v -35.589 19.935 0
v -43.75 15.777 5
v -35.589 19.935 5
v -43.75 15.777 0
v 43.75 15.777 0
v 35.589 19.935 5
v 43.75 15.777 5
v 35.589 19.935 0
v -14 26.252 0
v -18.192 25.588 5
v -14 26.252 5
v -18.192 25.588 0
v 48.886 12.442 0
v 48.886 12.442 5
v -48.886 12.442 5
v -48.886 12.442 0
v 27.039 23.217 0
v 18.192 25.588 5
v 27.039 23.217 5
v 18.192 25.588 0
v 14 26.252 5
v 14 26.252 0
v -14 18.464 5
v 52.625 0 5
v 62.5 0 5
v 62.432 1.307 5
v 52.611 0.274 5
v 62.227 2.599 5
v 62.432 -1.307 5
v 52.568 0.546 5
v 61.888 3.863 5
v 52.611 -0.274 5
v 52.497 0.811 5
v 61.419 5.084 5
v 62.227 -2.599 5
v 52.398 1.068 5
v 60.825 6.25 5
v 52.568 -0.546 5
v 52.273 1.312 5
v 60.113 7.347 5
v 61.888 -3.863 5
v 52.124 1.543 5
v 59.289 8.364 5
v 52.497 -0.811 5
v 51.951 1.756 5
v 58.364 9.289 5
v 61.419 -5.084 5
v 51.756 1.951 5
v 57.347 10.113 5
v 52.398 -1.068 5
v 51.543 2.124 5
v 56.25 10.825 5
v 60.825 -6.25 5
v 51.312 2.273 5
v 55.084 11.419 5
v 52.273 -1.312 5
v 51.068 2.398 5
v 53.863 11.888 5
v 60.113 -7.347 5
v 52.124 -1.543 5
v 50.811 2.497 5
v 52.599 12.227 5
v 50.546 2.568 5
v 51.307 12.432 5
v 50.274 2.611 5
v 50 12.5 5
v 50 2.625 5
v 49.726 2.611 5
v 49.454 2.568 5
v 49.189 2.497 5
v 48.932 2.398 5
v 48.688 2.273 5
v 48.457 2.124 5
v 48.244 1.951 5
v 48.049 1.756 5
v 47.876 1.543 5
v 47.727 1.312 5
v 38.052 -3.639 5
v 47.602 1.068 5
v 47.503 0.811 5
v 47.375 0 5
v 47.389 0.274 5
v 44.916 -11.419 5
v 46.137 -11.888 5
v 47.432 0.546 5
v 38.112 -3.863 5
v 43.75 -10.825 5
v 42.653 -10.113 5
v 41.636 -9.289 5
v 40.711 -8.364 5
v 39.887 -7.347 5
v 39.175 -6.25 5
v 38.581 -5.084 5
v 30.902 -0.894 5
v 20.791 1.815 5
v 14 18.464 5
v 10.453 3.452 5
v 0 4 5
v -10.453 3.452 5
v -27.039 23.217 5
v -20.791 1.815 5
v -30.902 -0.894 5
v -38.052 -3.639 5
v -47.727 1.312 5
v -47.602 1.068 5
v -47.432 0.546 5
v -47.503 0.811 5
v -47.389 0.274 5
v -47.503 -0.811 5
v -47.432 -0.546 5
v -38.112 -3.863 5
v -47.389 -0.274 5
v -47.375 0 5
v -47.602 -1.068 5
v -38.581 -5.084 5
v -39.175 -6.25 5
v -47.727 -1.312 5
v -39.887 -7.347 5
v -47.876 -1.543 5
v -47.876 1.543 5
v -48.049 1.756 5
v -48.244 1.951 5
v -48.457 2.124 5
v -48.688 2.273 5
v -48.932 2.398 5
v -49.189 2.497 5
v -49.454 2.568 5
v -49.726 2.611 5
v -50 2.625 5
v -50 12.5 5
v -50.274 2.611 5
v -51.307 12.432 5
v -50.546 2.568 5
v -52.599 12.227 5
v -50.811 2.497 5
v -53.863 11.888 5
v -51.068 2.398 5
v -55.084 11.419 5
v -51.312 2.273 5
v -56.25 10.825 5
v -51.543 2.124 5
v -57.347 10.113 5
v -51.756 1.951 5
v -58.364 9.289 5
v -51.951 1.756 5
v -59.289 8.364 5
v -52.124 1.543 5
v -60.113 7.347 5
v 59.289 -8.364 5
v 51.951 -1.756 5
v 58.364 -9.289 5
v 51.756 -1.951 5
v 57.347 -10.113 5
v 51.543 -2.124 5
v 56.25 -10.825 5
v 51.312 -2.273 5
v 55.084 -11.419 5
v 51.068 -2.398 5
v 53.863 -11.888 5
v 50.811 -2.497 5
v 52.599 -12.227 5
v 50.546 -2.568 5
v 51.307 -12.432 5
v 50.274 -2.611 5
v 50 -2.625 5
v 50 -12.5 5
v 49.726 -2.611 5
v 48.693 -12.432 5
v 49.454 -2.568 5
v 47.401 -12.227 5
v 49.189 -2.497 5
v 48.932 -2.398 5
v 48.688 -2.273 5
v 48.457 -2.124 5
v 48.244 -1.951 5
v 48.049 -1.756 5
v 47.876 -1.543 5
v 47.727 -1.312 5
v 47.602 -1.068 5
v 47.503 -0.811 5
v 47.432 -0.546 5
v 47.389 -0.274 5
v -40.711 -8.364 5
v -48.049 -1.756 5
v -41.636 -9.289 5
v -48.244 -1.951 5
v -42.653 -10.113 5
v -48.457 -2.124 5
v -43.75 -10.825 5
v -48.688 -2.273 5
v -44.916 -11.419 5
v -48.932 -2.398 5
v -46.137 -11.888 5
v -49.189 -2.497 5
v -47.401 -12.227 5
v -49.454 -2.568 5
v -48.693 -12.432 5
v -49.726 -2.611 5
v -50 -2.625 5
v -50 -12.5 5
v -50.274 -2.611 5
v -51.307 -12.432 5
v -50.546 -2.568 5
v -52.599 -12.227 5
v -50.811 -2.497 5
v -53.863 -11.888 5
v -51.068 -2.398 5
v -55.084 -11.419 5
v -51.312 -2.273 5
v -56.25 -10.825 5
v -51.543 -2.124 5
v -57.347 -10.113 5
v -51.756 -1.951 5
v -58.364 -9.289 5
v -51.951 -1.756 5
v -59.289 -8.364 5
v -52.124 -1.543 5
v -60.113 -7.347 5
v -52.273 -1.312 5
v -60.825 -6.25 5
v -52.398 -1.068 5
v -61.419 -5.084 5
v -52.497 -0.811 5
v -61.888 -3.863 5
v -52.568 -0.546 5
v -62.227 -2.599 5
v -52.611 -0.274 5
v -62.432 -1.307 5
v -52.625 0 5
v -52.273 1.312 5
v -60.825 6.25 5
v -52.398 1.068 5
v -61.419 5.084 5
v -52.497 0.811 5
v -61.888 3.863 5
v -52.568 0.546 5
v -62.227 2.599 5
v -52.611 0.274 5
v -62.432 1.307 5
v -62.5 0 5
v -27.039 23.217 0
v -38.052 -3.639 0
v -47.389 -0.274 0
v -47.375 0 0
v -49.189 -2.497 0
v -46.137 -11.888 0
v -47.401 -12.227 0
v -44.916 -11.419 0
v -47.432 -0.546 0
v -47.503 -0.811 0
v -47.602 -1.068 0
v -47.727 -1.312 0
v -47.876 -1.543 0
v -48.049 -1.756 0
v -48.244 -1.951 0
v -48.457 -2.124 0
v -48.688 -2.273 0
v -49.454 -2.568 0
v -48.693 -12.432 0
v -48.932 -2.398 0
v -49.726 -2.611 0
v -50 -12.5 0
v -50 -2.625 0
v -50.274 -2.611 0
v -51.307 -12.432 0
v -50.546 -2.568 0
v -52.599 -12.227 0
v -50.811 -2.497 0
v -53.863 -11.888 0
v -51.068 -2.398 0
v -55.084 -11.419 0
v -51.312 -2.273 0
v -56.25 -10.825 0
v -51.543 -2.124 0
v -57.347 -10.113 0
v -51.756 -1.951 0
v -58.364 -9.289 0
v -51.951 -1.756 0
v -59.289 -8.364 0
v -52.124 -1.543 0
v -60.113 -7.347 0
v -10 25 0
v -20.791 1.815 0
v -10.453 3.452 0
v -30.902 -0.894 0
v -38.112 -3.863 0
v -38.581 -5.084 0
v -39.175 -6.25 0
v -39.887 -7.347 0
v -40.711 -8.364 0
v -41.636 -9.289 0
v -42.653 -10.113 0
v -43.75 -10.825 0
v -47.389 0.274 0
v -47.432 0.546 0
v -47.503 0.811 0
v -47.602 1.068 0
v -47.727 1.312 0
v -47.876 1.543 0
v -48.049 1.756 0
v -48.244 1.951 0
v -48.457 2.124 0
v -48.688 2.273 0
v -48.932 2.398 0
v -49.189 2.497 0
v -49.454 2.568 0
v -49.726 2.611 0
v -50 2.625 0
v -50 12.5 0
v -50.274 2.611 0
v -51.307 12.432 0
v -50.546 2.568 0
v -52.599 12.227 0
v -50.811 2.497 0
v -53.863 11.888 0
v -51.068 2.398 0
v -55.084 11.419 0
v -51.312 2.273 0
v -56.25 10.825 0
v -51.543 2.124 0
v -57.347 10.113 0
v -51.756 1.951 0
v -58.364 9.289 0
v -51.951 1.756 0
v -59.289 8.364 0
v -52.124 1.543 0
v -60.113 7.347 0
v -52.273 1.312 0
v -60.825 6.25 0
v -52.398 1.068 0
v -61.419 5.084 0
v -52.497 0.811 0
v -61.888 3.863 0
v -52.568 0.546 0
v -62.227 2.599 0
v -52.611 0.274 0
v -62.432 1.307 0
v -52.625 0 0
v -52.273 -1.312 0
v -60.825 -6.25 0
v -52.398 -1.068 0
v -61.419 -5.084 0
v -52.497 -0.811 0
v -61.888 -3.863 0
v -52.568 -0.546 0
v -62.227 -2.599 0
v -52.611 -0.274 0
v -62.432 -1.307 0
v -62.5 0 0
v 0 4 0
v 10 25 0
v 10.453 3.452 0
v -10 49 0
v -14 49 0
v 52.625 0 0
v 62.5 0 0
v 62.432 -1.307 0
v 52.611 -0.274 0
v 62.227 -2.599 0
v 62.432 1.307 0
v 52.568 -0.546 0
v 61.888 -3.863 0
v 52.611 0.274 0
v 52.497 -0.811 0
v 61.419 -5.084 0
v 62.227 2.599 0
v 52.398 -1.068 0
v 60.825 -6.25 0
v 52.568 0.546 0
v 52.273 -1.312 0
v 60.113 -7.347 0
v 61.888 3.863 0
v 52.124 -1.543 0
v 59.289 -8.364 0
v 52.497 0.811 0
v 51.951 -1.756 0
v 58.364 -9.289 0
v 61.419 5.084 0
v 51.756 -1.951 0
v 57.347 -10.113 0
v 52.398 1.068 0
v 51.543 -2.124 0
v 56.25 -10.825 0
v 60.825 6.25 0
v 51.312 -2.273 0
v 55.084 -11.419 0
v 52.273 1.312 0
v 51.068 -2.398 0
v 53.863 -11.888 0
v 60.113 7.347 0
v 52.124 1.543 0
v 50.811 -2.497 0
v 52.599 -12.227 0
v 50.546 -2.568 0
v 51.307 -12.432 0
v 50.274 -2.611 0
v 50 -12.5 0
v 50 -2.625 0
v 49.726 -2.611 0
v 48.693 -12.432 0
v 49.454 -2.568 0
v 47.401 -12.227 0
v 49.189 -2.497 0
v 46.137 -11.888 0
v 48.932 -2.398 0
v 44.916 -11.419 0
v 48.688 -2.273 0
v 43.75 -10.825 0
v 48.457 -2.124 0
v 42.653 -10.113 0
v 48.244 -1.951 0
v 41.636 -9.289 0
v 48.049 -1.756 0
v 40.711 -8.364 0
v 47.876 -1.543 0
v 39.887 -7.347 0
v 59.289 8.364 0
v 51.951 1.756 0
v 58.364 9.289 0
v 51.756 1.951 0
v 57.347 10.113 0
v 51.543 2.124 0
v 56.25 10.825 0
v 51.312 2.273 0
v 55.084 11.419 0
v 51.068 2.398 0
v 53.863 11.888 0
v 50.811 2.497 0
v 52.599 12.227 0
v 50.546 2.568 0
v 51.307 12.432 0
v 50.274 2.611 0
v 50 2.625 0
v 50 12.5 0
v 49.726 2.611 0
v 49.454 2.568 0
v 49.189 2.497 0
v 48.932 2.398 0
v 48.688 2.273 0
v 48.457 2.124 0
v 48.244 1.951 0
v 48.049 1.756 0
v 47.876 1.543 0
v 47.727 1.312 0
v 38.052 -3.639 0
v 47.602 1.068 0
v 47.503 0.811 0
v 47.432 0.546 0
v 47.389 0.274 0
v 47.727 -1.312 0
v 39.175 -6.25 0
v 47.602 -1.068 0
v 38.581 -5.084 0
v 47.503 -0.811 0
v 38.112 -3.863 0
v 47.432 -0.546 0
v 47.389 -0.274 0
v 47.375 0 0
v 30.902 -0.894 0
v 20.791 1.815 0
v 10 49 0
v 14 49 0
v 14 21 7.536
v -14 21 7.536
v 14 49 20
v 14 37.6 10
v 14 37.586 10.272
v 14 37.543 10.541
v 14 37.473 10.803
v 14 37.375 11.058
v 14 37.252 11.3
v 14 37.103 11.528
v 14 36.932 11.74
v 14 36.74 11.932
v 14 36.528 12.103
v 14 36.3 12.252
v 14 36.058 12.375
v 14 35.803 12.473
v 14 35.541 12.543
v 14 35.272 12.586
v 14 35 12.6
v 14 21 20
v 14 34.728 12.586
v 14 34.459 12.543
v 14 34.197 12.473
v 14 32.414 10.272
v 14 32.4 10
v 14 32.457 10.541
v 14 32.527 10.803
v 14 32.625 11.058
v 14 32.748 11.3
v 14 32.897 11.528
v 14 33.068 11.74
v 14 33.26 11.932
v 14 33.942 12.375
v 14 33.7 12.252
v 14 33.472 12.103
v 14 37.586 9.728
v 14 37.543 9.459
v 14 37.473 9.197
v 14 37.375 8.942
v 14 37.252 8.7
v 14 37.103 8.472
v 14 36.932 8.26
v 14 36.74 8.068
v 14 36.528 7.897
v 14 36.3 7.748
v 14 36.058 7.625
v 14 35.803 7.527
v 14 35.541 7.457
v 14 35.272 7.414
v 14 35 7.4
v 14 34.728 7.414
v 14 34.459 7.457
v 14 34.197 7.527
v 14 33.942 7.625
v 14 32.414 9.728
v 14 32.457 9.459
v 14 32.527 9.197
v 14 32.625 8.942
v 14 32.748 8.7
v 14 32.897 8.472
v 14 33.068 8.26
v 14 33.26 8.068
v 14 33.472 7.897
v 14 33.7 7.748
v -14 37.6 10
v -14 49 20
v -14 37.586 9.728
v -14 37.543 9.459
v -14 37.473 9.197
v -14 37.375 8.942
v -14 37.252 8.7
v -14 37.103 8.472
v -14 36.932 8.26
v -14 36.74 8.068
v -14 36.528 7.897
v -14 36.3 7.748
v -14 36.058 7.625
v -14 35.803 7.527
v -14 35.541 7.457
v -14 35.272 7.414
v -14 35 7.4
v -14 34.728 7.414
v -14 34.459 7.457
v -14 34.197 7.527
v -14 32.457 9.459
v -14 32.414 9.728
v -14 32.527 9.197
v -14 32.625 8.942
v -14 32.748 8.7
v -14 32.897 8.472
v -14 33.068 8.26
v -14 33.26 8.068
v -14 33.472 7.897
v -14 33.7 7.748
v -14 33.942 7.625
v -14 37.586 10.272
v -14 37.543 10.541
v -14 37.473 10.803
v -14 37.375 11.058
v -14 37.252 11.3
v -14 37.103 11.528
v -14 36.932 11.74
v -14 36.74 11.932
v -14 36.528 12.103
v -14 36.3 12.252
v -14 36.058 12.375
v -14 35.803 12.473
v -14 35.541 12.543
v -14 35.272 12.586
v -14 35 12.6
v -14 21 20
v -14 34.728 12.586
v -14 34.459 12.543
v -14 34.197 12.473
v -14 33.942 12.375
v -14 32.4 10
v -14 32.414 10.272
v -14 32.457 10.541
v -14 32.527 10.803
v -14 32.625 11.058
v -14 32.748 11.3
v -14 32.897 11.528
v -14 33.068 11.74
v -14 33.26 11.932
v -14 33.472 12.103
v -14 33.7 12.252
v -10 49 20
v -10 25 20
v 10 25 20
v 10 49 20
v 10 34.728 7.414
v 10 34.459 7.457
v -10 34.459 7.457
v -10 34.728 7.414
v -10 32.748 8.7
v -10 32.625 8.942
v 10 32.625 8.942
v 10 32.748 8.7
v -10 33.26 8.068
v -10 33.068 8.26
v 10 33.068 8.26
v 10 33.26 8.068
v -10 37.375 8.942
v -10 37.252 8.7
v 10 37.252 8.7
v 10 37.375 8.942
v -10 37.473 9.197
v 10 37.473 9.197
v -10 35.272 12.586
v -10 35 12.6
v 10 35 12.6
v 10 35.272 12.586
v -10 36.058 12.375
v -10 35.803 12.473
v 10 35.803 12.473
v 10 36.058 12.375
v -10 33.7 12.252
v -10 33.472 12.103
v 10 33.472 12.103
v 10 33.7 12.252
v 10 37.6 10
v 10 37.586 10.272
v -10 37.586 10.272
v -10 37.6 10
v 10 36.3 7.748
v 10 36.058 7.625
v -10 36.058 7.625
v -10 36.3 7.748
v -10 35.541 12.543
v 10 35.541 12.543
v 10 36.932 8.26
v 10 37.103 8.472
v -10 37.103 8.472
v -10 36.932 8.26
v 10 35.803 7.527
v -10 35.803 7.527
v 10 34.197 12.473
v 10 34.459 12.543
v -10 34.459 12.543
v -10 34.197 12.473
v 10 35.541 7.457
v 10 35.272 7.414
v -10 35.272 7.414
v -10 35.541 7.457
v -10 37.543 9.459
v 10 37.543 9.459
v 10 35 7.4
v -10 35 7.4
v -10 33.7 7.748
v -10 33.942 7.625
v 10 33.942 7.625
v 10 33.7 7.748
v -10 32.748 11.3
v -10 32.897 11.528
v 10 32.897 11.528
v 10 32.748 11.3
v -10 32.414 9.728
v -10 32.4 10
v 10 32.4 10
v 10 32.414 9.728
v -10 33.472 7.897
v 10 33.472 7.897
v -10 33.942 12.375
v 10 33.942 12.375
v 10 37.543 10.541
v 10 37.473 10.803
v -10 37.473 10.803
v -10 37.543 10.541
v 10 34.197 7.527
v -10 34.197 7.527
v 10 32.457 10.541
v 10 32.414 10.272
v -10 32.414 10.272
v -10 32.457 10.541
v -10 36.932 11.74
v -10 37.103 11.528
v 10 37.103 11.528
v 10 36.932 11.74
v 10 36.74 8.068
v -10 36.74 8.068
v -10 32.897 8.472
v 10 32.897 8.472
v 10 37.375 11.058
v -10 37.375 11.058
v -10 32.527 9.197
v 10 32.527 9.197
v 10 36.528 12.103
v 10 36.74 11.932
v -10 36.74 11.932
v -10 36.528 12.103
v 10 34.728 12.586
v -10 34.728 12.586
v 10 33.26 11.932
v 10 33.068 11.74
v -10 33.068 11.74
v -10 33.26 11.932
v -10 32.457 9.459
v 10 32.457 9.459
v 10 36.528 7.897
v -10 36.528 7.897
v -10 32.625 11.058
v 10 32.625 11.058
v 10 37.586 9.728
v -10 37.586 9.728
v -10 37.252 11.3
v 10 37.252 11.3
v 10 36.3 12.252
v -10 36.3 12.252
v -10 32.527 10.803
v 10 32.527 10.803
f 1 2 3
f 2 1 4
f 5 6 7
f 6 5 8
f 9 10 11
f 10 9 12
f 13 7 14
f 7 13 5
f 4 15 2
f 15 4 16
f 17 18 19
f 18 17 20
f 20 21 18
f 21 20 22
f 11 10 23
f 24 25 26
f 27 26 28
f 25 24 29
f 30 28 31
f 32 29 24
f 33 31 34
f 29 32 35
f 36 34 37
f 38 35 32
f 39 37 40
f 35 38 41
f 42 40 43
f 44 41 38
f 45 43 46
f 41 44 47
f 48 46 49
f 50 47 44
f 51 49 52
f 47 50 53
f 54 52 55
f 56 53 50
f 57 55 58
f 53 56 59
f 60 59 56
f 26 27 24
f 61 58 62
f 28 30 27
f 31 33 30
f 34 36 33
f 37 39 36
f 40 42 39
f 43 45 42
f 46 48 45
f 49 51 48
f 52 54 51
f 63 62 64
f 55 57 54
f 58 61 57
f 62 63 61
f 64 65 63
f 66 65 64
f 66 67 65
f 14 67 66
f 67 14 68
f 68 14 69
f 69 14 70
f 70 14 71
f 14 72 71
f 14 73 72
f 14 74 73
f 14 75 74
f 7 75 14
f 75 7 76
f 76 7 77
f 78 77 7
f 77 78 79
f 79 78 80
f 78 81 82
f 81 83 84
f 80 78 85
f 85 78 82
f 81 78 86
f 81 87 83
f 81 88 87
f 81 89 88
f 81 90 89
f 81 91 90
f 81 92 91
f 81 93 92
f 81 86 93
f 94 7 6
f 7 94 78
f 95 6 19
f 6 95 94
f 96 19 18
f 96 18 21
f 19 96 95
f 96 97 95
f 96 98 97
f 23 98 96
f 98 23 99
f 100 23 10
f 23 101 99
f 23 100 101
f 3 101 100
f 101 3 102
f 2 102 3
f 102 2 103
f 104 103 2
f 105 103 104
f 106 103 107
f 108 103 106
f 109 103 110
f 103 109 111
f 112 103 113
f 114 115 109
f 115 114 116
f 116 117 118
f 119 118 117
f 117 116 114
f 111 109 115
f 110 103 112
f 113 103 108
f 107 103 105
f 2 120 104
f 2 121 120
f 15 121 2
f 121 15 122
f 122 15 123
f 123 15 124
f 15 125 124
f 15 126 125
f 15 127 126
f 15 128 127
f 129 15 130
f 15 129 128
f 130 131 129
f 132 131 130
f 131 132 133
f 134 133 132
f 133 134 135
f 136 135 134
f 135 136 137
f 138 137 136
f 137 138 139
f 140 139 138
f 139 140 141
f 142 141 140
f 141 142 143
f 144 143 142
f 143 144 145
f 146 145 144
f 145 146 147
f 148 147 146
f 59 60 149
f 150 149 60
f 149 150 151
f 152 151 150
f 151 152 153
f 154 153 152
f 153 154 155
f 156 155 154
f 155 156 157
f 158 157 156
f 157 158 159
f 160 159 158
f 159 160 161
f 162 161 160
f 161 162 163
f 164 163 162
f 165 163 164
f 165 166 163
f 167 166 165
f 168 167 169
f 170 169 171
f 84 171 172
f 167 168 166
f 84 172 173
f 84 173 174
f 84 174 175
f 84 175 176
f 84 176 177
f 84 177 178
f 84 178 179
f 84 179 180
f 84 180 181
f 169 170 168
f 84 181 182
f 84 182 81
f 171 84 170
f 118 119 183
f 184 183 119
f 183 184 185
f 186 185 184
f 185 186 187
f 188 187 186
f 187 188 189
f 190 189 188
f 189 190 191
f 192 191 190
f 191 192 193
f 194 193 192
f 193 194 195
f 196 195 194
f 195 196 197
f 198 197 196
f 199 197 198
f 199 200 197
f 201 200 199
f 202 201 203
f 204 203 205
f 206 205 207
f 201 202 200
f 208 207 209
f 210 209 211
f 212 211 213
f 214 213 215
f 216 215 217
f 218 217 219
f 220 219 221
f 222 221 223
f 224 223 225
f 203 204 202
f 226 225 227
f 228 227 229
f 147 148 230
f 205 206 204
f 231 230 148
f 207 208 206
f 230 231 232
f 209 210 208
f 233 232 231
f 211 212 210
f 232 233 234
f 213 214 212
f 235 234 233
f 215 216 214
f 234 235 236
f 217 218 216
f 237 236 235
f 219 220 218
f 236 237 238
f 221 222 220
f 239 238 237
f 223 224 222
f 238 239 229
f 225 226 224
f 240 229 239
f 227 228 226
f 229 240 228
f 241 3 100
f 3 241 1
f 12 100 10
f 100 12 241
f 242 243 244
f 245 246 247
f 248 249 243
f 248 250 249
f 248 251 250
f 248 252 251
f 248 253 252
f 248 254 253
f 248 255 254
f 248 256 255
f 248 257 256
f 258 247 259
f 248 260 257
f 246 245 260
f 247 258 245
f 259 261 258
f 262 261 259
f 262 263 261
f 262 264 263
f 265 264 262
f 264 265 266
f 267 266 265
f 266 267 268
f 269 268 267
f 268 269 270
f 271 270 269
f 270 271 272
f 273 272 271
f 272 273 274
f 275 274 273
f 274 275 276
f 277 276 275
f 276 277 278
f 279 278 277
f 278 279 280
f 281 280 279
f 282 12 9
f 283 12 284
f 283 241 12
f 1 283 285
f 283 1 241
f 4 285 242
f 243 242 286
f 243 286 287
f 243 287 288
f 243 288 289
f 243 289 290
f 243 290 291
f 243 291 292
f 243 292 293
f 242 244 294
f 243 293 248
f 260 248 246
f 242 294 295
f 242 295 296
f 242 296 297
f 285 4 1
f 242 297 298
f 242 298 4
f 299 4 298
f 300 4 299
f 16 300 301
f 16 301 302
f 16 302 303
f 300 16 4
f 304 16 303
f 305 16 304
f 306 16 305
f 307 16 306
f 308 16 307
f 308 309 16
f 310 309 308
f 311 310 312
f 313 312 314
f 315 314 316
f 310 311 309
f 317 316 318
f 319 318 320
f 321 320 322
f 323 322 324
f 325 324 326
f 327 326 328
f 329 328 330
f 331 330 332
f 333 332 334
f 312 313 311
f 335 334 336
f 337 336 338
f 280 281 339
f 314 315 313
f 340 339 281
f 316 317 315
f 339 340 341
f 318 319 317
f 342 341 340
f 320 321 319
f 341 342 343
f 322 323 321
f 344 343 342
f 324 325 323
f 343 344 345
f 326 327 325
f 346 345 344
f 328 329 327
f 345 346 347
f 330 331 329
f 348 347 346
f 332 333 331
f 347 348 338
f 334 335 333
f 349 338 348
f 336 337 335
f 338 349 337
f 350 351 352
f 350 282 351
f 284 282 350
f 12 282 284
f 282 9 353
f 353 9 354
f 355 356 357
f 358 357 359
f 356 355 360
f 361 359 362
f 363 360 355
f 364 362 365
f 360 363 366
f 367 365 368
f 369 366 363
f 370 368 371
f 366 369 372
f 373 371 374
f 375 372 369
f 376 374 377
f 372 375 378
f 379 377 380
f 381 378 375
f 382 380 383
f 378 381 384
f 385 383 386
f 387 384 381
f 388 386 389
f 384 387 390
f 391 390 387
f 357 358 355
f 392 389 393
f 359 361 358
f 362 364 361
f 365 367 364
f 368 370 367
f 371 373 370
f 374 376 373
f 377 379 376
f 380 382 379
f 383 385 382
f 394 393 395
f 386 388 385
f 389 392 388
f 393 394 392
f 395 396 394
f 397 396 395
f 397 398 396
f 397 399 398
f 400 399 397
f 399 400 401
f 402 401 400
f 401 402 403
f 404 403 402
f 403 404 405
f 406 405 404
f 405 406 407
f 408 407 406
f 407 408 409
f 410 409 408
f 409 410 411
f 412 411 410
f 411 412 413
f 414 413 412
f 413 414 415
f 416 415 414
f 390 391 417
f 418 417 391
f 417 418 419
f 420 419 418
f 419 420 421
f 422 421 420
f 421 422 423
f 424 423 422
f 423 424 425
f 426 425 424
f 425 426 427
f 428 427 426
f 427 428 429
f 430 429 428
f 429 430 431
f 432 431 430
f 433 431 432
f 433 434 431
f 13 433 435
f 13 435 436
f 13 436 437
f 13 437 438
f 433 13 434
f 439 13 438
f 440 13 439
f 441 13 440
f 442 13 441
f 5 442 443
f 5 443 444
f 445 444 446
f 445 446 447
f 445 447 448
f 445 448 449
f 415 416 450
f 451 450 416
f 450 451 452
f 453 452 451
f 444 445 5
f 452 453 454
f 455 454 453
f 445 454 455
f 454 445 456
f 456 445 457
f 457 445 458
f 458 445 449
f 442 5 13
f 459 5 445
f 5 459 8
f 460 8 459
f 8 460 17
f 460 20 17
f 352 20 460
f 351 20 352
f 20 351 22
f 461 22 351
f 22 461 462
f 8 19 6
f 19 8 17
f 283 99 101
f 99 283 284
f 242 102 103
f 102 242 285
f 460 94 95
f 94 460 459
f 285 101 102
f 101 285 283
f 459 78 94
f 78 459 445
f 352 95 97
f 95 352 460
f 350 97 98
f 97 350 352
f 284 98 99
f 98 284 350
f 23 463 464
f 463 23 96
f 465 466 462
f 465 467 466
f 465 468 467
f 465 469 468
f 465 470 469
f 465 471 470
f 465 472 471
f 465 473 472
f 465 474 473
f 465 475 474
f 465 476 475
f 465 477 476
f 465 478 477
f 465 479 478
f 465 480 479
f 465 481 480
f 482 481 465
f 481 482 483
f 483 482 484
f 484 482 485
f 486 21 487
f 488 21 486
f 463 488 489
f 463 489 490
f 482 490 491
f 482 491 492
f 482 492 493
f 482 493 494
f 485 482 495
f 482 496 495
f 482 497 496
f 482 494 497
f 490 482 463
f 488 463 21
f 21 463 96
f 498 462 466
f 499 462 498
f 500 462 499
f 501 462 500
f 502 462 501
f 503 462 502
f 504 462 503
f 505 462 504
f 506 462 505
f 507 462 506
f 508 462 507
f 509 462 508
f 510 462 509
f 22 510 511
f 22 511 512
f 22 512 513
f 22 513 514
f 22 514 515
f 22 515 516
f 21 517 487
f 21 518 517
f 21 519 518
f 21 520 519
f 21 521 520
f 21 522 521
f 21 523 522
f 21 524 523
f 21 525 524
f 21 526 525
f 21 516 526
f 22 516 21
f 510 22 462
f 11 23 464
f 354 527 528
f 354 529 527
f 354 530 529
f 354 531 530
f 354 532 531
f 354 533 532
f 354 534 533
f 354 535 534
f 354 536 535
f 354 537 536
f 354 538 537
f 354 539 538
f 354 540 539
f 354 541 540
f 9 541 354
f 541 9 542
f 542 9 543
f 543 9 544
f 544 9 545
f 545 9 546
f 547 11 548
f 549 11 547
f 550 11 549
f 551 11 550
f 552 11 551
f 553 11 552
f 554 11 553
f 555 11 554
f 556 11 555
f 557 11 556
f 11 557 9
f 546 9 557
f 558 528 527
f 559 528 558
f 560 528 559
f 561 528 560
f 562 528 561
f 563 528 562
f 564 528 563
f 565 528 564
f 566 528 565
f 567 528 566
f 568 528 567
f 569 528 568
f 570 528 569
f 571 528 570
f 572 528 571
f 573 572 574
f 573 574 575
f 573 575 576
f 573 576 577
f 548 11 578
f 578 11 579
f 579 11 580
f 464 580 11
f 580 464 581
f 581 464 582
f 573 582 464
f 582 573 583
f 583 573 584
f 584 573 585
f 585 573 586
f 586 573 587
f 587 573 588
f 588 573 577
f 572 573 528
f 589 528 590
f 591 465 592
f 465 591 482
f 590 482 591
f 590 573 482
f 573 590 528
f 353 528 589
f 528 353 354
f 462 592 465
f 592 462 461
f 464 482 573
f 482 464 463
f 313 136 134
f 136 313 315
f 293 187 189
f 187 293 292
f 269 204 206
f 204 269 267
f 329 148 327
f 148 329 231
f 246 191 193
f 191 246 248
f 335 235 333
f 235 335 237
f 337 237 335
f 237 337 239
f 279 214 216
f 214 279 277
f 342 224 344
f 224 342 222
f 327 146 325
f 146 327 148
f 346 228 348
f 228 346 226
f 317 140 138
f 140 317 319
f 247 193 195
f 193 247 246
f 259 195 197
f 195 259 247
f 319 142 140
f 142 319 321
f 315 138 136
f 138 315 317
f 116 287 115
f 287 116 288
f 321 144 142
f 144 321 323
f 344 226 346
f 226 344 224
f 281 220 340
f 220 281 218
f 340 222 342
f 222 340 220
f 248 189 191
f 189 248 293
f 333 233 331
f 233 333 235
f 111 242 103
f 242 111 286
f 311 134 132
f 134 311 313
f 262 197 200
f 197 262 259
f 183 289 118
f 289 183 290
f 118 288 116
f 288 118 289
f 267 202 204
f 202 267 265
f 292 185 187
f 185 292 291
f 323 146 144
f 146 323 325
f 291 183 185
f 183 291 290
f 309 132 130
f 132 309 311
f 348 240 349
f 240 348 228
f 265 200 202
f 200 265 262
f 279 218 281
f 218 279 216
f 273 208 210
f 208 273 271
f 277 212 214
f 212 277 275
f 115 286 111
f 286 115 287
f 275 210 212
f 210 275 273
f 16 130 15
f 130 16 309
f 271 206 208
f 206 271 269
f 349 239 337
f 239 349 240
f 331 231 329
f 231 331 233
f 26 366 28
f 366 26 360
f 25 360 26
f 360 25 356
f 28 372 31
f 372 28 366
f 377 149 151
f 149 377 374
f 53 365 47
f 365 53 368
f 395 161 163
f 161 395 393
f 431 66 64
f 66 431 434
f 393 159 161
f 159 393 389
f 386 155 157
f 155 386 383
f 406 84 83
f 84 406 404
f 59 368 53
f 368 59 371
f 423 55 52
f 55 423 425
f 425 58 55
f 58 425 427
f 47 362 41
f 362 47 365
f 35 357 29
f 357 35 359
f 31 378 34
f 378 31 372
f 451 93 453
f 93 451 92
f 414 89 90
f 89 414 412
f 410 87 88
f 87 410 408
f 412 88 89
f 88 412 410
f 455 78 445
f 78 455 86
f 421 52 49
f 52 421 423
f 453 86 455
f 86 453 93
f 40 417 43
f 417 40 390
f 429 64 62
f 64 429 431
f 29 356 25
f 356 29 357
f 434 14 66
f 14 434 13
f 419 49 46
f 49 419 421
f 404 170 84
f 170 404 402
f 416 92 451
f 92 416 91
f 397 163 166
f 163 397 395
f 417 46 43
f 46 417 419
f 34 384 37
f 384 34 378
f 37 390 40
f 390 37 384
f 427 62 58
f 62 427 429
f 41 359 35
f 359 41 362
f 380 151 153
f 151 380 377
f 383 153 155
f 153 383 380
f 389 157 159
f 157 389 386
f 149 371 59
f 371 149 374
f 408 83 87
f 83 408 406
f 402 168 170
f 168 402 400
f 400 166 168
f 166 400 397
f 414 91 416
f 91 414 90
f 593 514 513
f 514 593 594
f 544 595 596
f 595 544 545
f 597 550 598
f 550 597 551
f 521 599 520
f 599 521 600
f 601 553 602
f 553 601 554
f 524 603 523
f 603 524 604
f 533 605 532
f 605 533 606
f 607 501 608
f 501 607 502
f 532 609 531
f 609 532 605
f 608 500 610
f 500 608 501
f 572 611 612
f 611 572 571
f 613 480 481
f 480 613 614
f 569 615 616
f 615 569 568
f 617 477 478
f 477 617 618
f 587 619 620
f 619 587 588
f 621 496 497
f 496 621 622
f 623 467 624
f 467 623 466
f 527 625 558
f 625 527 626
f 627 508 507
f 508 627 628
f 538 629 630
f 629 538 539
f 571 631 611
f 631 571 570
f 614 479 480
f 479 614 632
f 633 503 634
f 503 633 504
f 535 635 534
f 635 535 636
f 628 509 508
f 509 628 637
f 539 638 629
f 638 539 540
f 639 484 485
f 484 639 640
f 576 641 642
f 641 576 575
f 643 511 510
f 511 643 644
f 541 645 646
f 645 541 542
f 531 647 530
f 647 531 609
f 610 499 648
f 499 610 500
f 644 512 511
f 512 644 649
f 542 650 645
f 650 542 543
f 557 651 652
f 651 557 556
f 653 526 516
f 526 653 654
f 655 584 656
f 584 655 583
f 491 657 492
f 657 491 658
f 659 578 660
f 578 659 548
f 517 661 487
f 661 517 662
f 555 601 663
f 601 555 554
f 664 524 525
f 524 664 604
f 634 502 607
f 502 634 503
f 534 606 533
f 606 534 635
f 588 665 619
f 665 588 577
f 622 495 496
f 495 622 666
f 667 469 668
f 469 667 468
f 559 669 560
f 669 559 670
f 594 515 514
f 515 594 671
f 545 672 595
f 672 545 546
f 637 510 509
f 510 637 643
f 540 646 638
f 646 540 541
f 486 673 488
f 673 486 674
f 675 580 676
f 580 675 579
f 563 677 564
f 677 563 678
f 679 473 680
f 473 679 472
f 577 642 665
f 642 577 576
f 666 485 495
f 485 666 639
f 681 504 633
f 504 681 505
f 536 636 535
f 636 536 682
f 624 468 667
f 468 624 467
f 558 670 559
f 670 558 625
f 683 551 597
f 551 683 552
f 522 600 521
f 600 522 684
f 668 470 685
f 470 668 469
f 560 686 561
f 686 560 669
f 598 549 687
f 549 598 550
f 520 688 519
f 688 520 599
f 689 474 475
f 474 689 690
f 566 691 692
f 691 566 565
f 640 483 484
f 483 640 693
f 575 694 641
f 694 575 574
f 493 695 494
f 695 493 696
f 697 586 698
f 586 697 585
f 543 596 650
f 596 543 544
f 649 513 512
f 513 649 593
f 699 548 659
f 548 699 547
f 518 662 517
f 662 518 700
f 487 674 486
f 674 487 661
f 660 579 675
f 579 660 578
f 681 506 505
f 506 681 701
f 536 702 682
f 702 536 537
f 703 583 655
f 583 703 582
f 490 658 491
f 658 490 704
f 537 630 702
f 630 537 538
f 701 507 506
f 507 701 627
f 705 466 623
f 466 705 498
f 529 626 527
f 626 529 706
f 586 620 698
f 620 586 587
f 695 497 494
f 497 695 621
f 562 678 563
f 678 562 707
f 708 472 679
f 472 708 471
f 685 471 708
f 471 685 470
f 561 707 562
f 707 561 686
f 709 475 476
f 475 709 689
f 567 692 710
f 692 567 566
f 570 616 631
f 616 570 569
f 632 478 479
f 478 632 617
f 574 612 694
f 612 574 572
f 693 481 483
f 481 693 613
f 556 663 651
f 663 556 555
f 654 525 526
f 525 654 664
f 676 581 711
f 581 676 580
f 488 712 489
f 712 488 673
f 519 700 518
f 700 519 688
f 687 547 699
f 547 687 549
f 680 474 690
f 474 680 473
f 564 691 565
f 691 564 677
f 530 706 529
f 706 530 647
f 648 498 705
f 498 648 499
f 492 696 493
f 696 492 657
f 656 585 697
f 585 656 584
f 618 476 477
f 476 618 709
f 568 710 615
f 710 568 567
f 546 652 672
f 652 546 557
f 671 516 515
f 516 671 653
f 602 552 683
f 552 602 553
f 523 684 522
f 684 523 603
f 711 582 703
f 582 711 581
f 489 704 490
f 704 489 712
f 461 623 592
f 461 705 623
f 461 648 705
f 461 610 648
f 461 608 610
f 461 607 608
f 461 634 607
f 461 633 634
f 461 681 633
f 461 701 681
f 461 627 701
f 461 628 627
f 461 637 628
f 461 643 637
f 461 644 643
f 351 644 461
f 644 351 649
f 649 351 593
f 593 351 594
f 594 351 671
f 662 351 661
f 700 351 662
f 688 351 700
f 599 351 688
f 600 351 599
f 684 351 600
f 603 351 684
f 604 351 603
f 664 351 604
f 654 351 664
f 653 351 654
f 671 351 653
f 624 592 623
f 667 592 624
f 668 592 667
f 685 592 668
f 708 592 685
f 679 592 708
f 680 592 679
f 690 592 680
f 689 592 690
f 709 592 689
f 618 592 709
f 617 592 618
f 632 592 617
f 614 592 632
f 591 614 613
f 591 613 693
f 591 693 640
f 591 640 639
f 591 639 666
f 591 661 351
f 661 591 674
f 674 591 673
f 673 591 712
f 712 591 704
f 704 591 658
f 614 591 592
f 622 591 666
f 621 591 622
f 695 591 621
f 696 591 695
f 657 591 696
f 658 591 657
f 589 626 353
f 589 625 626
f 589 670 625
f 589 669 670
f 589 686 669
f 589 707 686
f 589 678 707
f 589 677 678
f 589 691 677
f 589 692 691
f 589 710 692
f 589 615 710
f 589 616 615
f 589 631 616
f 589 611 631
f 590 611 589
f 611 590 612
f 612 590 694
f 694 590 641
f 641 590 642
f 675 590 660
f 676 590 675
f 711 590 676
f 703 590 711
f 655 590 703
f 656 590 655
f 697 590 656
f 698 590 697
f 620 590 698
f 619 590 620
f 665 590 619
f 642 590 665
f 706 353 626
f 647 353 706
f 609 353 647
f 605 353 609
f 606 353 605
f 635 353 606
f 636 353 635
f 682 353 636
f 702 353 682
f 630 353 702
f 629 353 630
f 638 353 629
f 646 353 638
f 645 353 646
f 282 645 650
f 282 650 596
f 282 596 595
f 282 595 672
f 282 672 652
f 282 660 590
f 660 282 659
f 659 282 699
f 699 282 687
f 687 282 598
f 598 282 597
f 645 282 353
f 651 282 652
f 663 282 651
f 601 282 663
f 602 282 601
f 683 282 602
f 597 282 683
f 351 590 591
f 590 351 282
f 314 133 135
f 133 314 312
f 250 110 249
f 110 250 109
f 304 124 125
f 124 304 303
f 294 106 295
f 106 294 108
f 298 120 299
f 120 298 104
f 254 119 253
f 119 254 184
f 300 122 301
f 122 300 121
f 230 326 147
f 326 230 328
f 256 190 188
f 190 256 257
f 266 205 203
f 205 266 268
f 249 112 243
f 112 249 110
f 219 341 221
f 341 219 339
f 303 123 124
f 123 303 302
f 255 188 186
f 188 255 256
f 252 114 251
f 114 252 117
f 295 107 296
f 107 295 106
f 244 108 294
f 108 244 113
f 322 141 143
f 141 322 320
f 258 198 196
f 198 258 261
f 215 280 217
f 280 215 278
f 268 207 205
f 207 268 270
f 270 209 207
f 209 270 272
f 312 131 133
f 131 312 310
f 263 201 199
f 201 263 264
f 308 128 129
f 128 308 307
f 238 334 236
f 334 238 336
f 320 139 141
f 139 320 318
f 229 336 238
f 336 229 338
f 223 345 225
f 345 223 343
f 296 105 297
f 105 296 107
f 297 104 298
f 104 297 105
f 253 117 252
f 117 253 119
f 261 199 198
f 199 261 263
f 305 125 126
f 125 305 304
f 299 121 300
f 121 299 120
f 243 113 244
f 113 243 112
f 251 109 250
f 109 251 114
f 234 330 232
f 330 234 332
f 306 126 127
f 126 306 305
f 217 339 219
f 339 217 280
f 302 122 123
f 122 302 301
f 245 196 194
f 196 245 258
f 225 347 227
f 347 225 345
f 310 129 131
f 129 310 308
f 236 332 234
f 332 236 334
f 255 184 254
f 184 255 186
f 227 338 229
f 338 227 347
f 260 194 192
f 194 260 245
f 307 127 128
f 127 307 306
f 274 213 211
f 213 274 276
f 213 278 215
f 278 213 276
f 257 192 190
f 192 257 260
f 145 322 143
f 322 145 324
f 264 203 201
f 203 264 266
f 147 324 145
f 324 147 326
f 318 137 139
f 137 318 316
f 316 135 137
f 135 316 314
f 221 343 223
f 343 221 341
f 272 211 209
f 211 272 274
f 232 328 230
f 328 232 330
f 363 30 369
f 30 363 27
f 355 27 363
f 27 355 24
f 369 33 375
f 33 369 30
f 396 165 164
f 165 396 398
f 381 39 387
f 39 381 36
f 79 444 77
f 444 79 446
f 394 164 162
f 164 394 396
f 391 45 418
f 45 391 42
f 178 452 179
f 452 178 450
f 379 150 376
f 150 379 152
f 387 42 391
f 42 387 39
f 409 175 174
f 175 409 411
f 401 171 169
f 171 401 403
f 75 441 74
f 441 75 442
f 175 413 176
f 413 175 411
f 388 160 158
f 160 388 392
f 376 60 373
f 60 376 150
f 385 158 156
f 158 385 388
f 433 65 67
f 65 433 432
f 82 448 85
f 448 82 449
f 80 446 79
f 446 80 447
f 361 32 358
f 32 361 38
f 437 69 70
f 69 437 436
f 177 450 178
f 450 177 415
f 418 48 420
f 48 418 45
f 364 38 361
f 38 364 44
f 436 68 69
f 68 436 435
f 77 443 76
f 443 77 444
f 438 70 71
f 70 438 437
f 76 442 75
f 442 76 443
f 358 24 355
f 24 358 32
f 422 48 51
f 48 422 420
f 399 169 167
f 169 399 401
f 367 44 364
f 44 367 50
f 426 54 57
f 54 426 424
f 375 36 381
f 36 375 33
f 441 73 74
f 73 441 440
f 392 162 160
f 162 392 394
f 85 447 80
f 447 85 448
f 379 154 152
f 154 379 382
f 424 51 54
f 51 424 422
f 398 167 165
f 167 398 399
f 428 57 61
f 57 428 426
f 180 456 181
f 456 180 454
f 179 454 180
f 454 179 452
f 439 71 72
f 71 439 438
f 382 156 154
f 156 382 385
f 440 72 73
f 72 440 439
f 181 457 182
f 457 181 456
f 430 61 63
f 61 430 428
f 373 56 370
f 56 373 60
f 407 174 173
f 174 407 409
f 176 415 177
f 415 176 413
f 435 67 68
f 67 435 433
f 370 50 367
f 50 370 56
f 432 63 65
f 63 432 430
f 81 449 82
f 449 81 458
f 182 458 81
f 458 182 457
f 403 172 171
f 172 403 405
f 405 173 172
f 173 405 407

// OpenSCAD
// Use 625ZZ bearings and a smooth GT2 pulley like http://www.thingiverse.com/thing:651552
// M5 screw with spacer for the bearing
// M5 screw with t-nuts for extrusion

$fn = 60;
thickness = 5;

difference() {
  union() {
    // fillet
    translate([0,22,thickness])
      rotate([45,0,0])
      cube ([28,5,5], center=true);
    
    // wrap the extrusion
    translate([0,35,10])
      cube([28,28,20], center=true);

    // main arm
    difference() {
        translate([0,-60,thickness/2])
          cylinder(d=175,h=thickness, center=true);
        translate([0,-96,thickness/2])
          cylinder(d=200,h=thickness+0.1, center=true);
        translate([86,-28,0])
          cylinder(d=100,h=thickness*2.1, center=true);
        translate([-86,-28,0])
          cylinder(d=100,h=thickness*2.1, center=true);
      }

      // right circle
      translate([-50,0,thickness/2]) cylinder(d=25, h=thickness, center=true);
        
      // left circle
      translate([50,0,thickness/2]) cylinder(d=25, h=thickness, center=true);
  }
  
  // cutout right and left bearing screw holes
  translate([-50,0,thickness/2]) {
    cylinder(d=5.25, h=50, center=true);
  }
  translate([50,0,thickness/2]) {
    cylinder(d=5.25, h=50, center=true);
  }

  // cutout the extrusion and screw mounting holes
  translate([0,35,10]) {
    rotate([0,90,0]) cylinder(d=5.2, h=50, center=true);
    translate([0,5,0]) cube([20,30,100], center=true);
  }
}
